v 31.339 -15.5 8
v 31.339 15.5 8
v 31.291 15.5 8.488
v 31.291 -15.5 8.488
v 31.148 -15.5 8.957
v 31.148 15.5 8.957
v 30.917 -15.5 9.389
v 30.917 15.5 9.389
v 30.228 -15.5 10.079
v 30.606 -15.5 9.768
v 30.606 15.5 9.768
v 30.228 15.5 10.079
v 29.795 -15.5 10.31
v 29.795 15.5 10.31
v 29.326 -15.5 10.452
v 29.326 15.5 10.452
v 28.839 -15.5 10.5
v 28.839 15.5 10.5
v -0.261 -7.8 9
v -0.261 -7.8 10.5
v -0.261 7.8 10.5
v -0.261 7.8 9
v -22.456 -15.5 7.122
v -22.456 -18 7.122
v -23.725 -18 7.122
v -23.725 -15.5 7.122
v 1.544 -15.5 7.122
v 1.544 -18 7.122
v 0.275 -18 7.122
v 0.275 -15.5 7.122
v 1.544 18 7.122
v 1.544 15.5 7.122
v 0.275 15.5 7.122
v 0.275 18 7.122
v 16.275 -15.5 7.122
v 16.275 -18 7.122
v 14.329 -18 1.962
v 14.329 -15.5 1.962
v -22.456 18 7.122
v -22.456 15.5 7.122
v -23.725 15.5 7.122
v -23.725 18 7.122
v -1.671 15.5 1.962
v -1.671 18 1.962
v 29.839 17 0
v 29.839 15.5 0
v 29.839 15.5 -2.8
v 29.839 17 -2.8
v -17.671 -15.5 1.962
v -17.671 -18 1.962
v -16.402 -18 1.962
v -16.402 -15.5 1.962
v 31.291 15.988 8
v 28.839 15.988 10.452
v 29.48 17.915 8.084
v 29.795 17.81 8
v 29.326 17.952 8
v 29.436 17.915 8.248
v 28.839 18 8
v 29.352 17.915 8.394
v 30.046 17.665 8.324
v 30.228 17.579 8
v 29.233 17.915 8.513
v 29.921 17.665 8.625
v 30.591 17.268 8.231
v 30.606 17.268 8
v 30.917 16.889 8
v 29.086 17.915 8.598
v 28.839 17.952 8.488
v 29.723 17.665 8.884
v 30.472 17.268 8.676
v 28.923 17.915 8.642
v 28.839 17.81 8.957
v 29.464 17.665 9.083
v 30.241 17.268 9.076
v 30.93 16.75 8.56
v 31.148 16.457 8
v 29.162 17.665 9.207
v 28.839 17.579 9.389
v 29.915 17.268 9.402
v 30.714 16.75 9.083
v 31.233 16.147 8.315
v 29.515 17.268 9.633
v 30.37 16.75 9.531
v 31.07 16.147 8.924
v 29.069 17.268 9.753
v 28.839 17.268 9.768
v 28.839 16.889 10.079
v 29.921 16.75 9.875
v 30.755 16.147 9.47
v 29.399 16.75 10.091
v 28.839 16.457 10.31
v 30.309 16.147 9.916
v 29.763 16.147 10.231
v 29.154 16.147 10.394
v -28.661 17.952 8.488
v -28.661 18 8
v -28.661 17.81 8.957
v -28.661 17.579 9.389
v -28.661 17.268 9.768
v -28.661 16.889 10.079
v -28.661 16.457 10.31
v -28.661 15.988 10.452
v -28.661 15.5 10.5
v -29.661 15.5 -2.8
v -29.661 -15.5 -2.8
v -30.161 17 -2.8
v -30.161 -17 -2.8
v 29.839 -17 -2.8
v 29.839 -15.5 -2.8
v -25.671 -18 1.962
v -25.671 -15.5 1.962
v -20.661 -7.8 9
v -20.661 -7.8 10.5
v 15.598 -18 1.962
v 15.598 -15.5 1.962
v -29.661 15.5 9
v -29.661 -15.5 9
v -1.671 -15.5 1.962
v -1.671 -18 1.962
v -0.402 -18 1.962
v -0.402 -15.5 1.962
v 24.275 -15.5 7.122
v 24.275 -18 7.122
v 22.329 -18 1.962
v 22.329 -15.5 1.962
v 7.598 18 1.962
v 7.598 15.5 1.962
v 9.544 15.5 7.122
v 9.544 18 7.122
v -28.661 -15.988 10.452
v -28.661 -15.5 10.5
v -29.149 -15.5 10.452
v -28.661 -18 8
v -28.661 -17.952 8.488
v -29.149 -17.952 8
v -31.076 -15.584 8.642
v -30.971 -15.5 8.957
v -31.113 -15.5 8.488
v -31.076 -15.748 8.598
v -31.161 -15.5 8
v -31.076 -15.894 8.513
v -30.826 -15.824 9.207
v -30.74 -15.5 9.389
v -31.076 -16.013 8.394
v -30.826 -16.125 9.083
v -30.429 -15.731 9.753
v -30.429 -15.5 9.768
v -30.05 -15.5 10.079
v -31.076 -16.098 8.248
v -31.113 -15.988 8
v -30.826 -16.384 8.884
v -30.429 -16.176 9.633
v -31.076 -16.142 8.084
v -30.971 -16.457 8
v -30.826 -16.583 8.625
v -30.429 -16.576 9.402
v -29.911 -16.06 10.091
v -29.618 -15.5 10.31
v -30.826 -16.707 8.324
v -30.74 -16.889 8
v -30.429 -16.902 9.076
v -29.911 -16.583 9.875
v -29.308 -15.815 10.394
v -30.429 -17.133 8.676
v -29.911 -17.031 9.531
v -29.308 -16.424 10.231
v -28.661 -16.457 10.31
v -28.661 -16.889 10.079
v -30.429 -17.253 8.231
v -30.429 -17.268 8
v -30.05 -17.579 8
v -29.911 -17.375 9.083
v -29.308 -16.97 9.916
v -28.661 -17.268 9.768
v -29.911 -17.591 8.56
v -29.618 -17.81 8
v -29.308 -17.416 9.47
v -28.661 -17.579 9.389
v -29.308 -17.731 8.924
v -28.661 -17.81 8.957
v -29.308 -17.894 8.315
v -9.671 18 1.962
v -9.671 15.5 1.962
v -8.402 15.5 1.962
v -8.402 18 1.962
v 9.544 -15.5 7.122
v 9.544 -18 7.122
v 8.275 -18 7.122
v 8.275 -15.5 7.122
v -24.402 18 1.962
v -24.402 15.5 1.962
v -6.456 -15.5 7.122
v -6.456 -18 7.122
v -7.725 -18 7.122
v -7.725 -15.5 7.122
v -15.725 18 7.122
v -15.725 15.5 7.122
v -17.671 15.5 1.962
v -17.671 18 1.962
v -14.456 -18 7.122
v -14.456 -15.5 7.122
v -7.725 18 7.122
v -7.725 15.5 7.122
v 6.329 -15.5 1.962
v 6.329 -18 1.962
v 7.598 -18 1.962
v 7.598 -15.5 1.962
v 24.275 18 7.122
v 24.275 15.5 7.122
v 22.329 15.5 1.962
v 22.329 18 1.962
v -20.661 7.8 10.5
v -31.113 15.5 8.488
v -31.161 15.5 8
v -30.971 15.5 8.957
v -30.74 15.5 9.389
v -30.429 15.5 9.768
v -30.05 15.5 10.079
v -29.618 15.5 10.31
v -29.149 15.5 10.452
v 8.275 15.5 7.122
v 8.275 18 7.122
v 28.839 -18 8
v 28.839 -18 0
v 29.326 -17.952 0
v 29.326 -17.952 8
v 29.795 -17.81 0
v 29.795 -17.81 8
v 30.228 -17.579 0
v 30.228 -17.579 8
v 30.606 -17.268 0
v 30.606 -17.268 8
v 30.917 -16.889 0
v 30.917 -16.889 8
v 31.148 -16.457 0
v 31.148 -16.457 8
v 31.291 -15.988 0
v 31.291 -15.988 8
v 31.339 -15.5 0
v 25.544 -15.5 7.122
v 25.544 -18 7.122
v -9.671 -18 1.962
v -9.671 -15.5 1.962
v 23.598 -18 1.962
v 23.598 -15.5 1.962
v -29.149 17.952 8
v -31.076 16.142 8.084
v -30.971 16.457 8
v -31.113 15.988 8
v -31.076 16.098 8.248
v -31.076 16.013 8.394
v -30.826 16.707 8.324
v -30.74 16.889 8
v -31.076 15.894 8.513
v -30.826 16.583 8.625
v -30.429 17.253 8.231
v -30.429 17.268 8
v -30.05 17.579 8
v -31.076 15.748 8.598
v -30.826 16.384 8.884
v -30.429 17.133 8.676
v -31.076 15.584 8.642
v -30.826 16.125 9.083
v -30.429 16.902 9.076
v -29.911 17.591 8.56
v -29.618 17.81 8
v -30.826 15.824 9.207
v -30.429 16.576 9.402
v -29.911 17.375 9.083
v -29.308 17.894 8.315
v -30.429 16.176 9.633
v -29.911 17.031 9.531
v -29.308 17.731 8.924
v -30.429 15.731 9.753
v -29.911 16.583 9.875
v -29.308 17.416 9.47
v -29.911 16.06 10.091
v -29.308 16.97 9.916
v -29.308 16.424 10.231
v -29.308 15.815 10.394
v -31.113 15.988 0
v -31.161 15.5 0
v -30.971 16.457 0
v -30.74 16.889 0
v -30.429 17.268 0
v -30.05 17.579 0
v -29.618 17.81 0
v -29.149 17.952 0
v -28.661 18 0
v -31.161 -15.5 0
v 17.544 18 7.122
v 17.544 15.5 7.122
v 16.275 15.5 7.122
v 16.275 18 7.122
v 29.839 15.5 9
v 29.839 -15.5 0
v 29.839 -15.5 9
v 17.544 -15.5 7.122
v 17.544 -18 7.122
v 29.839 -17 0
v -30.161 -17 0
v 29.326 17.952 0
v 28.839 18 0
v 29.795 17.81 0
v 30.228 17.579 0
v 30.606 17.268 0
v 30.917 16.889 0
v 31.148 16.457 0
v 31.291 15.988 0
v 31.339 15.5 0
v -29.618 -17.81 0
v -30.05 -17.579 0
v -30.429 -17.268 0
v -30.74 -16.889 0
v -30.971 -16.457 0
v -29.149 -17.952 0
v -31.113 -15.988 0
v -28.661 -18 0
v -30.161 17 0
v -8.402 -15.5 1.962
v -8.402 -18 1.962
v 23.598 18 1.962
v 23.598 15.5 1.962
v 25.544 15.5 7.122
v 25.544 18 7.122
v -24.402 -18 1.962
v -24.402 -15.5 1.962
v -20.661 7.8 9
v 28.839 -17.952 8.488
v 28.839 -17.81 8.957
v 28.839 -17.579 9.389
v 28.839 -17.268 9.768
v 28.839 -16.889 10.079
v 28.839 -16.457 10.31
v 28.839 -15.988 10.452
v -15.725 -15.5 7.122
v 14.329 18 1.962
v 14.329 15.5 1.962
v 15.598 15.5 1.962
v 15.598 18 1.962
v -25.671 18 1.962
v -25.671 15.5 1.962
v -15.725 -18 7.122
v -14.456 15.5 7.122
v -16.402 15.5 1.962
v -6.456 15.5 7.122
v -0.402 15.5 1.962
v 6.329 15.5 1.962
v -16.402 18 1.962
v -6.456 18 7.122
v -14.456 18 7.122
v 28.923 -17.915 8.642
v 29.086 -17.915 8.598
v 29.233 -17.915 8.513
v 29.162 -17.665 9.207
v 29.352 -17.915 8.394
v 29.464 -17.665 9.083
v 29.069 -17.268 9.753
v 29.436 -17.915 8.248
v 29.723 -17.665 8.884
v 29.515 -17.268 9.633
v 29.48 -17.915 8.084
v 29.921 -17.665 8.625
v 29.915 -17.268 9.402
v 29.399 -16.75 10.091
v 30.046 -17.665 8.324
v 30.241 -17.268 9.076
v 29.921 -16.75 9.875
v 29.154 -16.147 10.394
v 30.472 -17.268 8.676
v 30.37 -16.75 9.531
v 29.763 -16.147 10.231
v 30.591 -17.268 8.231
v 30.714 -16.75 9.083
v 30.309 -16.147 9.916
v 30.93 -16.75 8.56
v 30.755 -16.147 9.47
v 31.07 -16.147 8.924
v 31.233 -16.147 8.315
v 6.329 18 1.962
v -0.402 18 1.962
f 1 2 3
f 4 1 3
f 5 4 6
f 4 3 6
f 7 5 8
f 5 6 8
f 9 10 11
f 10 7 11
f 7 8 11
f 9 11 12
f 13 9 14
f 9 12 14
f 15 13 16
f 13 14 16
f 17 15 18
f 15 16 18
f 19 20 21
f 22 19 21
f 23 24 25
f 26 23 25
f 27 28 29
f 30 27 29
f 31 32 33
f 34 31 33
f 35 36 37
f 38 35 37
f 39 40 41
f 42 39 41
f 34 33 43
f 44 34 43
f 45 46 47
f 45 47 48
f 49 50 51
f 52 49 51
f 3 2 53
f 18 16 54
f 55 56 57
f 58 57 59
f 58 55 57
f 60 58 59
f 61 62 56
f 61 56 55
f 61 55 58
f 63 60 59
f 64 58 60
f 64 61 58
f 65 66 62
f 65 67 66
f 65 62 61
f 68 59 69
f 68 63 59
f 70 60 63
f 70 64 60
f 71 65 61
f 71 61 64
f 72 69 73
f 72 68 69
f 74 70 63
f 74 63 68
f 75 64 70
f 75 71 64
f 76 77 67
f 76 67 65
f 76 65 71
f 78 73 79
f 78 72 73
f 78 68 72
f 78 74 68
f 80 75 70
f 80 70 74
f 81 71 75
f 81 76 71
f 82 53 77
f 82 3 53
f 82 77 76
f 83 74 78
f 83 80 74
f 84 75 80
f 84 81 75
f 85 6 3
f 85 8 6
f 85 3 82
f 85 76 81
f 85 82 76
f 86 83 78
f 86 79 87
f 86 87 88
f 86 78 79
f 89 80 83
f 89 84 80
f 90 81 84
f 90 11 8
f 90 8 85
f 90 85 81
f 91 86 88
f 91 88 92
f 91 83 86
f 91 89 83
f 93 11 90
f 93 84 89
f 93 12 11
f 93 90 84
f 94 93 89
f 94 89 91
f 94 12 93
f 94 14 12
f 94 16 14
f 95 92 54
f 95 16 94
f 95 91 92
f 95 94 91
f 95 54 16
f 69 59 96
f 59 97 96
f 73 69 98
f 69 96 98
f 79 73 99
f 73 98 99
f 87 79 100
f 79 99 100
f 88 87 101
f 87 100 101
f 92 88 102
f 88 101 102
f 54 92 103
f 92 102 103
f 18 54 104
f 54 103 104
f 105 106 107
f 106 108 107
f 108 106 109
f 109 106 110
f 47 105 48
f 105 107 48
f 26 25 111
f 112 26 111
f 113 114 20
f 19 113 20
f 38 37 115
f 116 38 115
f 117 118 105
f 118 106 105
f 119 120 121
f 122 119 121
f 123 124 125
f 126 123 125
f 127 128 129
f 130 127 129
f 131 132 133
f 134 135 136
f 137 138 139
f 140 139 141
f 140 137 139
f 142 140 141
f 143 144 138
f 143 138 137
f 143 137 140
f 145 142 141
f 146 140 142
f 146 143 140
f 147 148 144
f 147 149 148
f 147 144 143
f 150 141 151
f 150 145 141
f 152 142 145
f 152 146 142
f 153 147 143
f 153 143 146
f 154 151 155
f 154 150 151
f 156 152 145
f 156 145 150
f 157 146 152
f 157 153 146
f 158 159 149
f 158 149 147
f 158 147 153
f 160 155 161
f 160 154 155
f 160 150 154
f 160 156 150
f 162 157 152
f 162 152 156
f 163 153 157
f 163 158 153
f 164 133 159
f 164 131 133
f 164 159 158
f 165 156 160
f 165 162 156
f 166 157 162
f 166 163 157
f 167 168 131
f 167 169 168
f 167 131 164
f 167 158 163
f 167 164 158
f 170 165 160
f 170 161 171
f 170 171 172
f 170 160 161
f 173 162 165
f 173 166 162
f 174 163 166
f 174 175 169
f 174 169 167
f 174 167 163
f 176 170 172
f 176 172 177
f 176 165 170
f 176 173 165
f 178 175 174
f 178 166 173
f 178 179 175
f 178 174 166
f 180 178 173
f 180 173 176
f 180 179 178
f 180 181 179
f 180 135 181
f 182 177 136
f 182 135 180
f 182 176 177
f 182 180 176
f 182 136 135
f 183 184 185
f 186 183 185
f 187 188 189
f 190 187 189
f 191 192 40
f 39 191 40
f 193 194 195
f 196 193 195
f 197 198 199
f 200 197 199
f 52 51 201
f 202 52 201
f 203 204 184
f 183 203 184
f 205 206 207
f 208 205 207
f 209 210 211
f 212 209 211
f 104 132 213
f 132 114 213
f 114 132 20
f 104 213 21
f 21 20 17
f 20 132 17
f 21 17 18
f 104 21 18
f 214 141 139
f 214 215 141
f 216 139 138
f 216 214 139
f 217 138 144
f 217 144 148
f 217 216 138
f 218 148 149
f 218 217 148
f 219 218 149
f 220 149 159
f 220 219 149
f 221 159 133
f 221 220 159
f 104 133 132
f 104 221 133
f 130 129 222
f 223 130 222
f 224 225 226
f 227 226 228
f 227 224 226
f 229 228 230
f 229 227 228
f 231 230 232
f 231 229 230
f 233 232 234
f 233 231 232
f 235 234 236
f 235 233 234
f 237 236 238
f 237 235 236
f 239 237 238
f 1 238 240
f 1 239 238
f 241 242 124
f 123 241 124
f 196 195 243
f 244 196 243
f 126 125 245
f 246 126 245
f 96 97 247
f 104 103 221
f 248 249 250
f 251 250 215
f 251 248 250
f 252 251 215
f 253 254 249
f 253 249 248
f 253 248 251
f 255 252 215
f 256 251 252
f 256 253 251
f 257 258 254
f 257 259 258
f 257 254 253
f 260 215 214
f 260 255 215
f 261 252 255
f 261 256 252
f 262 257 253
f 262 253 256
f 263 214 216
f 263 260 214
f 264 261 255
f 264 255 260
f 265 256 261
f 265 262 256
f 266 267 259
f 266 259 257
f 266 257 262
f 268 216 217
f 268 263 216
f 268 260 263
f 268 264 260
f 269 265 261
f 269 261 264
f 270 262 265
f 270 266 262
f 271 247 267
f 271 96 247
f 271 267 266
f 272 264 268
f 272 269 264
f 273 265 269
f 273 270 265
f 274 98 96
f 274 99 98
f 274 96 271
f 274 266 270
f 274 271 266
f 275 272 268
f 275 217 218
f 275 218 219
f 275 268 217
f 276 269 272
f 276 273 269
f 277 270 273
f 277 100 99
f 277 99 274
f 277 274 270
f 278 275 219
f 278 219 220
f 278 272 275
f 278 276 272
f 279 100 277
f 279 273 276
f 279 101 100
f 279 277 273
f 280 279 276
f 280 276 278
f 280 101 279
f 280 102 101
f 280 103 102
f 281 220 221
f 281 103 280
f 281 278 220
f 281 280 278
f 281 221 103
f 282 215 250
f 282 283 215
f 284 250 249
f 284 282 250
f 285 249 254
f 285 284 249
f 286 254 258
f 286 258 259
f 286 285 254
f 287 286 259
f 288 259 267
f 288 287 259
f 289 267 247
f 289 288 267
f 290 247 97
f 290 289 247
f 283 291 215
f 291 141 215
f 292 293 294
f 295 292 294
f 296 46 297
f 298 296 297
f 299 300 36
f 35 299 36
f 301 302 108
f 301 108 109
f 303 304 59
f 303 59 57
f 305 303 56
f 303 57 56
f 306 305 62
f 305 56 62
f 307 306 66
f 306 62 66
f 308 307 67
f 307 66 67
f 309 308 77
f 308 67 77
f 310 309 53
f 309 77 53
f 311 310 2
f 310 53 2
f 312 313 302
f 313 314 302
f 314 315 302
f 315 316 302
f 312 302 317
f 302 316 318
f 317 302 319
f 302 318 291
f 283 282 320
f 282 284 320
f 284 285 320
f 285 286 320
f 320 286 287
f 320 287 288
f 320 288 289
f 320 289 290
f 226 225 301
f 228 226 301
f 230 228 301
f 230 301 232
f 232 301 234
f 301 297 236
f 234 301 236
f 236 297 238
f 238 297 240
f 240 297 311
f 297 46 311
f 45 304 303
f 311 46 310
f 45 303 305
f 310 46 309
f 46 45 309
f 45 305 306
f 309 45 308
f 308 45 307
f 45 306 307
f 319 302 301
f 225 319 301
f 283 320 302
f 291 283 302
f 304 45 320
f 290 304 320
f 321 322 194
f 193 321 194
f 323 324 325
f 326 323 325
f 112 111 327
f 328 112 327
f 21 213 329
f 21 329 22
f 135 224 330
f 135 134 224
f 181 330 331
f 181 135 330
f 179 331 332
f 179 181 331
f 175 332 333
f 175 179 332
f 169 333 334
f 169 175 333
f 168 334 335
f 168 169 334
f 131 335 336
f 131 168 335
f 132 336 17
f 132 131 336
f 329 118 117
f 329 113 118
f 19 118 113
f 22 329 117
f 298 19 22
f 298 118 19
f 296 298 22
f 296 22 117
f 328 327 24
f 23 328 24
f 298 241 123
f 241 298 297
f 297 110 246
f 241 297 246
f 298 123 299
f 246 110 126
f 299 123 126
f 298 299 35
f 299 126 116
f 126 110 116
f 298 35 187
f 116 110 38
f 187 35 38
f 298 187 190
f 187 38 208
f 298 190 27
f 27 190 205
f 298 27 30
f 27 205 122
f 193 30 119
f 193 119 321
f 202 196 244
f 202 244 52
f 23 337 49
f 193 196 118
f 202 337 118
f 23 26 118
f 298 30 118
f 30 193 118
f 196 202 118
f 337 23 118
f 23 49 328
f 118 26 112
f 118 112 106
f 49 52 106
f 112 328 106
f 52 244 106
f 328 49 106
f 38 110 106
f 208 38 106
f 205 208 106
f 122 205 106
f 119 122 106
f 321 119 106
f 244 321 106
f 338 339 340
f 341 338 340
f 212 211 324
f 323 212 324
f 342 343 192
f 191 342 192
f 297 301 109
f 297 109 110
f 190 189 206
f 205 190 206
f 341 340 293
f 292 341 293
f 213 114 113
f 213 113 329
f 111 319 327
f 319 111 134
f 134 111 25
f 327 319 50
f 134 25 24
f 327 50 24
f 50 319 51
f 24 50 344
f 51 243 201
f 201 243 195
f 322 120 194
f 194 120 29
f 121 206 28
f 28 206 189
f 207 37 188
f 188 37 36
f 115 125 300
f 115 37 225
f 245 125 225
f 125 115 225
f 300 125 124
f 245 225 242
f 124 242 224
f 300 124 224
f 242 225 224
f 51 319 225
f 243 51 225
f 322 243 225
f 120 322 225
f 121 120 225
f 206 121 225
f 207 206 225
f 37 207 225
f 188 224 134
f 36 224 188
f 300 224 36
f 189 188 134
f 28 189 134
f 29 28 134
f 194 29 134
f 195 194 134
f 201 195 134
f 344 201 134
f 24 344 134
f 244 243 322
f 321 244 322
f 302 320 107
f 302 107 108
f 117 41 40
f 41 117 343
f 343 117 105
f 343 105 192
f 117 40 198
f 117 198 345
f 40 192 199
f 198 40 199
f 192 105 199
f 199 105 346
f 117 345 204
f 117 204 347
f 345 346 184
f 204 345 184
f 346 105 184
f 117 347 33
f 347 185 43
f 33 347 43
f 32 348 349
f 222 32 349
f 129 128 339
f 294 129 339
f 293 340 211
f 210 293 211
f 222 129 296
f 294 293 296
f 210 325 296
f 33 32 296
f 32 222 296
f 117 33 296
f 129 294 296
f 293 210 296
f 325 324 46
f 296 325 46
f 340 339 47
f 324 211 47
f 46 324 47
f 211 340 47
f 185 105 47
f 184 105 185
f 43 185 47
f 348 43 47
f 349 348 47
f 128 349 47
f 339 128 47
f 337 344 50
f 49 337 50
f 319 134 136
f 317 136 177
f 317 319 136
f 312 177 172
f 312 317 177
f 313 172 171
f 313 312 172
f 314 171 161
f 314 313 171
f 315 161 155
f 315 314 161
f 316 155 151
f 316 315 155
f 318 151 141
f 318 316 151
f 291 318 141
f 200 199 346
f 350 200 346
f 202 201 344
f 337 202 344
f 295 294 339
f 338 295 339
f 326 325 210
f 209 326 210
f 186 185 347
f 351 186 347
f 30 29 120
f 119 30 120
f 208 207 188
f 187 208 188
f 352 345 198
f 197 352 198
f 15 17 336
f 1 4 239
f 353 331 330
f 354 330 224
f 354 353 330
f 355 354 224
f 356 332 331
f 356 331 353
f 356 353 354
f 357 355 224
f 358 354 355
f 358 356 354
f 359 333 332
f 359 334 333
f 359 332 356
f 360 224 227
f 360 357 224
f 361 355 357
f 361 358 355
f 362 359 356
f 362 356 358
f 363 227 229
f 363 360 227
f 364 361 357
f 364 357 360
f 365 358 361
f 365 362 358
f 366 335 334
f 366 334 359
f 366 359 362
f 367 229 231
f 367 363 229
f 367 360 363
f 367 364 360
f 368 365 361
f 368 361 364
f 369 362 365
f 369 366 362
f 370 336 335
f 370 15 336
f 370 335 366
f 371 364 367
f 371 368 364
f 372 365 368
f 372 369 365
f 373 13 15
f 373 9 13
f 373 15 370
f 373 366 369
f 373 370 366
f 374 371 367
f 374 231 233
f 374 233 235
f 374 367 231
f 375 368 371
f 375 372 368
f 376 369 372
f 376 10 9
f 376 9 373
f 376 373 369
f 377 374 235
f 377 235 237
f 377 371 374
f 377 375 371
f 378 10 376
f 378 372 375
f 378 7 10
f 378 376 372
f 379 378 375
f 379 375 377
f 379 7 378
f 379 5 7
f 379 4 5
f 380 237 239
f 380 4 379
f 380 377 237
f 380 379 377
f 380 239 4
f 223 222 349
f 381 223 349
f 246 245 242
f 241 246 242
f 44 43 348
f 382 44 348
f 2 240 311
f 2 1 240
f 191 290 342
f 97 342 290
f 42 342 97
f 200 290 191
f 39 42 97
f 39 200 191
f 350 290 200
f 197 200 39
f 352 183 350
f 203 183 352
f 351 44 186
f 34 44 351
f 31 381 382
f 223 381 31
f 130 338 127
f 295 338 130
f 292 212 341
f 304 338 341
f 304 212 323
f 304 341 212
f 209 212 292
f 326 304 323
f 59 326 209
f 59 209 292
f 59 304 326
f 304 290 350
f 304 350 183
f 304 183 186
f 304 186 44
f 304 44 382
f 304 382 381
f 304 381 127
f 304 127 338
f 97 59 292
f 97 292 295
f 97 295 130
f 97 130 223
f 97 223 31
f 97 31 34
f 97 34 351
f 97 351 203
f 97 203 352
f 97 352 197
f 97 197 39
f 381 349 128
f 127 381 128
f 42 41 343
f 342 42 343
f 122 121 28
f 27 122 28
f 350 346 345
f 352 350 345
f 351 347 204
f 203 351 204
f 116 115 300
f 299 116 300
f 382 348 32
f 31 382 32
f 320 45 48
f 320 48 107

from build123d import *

# Parameters (mm, degrees)
F1_DEPTH  = 2.8
F0_W      = 62.5
F0_H      = 36
F2_DEPTH  = 9
F3_W      = 36
F3_H      = 1.5
F4_DEPTH  = 62.5
F5_R      = 2.5
F6_DEPTH  = 1
F9_W      = 20.4
F9_H      = 15.6
F10_DEPTH = 13.301
F12_DEPTH = 50


# Not quite as in the source:
# - a feature names something its author has since deleted; it is built from what else it names


with BuildPart() as f1:
    # F0 (on Top) → F1 (new body)
    with BuildSketch(Plane.XY):
        Polygon((29.8387005084, 17), (-30.1612994916, 17), (-30.1612994916, -17), (29.8387005084, -17), (29.8387005084, -15.5), (-28.6612994916, -15.5), (-28.6612994916, 15.5), (29.8387005084, 15.5), align=None)
    extrude(amount=-F1_DEPTH)

    # F0 (on Top) → F2 (join)
    with BuildSketch(Plane.XY):
        with Locations((0.0887005084, 0)):
            Rectangle(F0_W, F0_H)
        Polygon((-30.1612994916, -17), (-30.1612994916, 17), (29.8387005084, 17), (29.8387005084, 15.5), (29.8387005084, -15.5), (29.8387005084, -17), align=None, mode=Mode.SUBTRACT)
        Polygon((29.8387005084, 17), (-30.1612994916, 17), (-30.1612994916, -17), (29.8387005084, -17), (29.8387005084, -15.5), (-28.6612994916, -15.5), (-28.6612994916, 15.5), (29.8387005084, 15.5), align=None)
    extrude(amount=F2_DEPTH)

    # F3 (on face) → F4 (join, through all)
    with BuildSketch(Plane.YZ.offset(31.3387005084)):
        with Locations((0, 9.75)):
            Rectangle(F3_W, F3_H)
    extrude(amount=-F4_DEPTH)

    # F5
    f5_edges = [f1.edges().sort_by_distance(p)[0] for p in [
        (31.338701, 0, 10.5),
        (0.088701, -18, 10.5),
        (31.338701, -18, 5.25),
        (31.338701, 18, 5.25),
        (0.088701, 18, 10.5),
        (-31.161299, 18, 5.25),
        (-31.161299, 0, 10.5),
        (-31.161299, -18, 5.25),
    ]]
    fillet(f5_edges, radius=F5_R)

    # F6 (cut): a face of the model
    f6_faces = [f1.faces().sort_by_distance(p)[0] for p in [
        (-28.6612994916, 0, 3.1),
    ]]
    extrude(f6_faces, amount=-F6_DEPTH, mode=Mode.SUBTRACT)

    # F9 (on face) → F10 (cut, through all)
    with BuildSketch(Plane.XY.offset(10.5)):
        with Locations((-10.4612994916, 0)):
            Rectangle(F9_W, F9_H)
    extrude(amount=-F10_DEPTH, mode=Mode.SUBTRACT)

    # F11 (on face) → F12 (cut)
    with BuildSketch(Plane.XZ.offset(18)):
        Polygon((-23.7249415368, 7.122464478), (-25.6706383079, 1.9621371757), (-24.4017057121, 1.9621371757), (-22.4560089409, 7.122464478), align=None)
        Polygon((-15.7249415368, 7.122464478), (-17.6706383079, 1.9621371757), (-16.4017057121, 1.9621371757), (-14.4560089409, 7.122464478), align=None)
        Polygon((-7.7249415368, 7.122464478), (-9.6706383079, 1.9621371757), (-8.4017057121, 1.9621371757), (-6.4560089409, 7.122464478), align=None)
        Polygon((0.2750584632, 7.122464478), (-1.6706383079, 1.9621371757), (-0.4017057121, 1.9621371757), (1.5439910591, 7.122464478), align=None)
        Polygon((8.2750584632, 7.122464478), (6.3293616921, 1.9621371757), (7.5982942879, 1.9621371757), (9.5439910591, 7.122464478), align=None)
        Polygon((16.2750584632, 7.122464478), (14.3293616921, 1.9621371757), (15.5982942879, 1.9621371757), (17.5439910591, 7.122464478), align=None)
        Polygon((24.2750584632, 7.122464478), (22.3293616921, 1.9621371757), (23.5982942879, 1.9621371757), (25.5439910591, 7.122464478), align=None)
    extrude(amount=-F12_DEPTH, mode=Mode.SUBTRACT)


solid = f1.part
